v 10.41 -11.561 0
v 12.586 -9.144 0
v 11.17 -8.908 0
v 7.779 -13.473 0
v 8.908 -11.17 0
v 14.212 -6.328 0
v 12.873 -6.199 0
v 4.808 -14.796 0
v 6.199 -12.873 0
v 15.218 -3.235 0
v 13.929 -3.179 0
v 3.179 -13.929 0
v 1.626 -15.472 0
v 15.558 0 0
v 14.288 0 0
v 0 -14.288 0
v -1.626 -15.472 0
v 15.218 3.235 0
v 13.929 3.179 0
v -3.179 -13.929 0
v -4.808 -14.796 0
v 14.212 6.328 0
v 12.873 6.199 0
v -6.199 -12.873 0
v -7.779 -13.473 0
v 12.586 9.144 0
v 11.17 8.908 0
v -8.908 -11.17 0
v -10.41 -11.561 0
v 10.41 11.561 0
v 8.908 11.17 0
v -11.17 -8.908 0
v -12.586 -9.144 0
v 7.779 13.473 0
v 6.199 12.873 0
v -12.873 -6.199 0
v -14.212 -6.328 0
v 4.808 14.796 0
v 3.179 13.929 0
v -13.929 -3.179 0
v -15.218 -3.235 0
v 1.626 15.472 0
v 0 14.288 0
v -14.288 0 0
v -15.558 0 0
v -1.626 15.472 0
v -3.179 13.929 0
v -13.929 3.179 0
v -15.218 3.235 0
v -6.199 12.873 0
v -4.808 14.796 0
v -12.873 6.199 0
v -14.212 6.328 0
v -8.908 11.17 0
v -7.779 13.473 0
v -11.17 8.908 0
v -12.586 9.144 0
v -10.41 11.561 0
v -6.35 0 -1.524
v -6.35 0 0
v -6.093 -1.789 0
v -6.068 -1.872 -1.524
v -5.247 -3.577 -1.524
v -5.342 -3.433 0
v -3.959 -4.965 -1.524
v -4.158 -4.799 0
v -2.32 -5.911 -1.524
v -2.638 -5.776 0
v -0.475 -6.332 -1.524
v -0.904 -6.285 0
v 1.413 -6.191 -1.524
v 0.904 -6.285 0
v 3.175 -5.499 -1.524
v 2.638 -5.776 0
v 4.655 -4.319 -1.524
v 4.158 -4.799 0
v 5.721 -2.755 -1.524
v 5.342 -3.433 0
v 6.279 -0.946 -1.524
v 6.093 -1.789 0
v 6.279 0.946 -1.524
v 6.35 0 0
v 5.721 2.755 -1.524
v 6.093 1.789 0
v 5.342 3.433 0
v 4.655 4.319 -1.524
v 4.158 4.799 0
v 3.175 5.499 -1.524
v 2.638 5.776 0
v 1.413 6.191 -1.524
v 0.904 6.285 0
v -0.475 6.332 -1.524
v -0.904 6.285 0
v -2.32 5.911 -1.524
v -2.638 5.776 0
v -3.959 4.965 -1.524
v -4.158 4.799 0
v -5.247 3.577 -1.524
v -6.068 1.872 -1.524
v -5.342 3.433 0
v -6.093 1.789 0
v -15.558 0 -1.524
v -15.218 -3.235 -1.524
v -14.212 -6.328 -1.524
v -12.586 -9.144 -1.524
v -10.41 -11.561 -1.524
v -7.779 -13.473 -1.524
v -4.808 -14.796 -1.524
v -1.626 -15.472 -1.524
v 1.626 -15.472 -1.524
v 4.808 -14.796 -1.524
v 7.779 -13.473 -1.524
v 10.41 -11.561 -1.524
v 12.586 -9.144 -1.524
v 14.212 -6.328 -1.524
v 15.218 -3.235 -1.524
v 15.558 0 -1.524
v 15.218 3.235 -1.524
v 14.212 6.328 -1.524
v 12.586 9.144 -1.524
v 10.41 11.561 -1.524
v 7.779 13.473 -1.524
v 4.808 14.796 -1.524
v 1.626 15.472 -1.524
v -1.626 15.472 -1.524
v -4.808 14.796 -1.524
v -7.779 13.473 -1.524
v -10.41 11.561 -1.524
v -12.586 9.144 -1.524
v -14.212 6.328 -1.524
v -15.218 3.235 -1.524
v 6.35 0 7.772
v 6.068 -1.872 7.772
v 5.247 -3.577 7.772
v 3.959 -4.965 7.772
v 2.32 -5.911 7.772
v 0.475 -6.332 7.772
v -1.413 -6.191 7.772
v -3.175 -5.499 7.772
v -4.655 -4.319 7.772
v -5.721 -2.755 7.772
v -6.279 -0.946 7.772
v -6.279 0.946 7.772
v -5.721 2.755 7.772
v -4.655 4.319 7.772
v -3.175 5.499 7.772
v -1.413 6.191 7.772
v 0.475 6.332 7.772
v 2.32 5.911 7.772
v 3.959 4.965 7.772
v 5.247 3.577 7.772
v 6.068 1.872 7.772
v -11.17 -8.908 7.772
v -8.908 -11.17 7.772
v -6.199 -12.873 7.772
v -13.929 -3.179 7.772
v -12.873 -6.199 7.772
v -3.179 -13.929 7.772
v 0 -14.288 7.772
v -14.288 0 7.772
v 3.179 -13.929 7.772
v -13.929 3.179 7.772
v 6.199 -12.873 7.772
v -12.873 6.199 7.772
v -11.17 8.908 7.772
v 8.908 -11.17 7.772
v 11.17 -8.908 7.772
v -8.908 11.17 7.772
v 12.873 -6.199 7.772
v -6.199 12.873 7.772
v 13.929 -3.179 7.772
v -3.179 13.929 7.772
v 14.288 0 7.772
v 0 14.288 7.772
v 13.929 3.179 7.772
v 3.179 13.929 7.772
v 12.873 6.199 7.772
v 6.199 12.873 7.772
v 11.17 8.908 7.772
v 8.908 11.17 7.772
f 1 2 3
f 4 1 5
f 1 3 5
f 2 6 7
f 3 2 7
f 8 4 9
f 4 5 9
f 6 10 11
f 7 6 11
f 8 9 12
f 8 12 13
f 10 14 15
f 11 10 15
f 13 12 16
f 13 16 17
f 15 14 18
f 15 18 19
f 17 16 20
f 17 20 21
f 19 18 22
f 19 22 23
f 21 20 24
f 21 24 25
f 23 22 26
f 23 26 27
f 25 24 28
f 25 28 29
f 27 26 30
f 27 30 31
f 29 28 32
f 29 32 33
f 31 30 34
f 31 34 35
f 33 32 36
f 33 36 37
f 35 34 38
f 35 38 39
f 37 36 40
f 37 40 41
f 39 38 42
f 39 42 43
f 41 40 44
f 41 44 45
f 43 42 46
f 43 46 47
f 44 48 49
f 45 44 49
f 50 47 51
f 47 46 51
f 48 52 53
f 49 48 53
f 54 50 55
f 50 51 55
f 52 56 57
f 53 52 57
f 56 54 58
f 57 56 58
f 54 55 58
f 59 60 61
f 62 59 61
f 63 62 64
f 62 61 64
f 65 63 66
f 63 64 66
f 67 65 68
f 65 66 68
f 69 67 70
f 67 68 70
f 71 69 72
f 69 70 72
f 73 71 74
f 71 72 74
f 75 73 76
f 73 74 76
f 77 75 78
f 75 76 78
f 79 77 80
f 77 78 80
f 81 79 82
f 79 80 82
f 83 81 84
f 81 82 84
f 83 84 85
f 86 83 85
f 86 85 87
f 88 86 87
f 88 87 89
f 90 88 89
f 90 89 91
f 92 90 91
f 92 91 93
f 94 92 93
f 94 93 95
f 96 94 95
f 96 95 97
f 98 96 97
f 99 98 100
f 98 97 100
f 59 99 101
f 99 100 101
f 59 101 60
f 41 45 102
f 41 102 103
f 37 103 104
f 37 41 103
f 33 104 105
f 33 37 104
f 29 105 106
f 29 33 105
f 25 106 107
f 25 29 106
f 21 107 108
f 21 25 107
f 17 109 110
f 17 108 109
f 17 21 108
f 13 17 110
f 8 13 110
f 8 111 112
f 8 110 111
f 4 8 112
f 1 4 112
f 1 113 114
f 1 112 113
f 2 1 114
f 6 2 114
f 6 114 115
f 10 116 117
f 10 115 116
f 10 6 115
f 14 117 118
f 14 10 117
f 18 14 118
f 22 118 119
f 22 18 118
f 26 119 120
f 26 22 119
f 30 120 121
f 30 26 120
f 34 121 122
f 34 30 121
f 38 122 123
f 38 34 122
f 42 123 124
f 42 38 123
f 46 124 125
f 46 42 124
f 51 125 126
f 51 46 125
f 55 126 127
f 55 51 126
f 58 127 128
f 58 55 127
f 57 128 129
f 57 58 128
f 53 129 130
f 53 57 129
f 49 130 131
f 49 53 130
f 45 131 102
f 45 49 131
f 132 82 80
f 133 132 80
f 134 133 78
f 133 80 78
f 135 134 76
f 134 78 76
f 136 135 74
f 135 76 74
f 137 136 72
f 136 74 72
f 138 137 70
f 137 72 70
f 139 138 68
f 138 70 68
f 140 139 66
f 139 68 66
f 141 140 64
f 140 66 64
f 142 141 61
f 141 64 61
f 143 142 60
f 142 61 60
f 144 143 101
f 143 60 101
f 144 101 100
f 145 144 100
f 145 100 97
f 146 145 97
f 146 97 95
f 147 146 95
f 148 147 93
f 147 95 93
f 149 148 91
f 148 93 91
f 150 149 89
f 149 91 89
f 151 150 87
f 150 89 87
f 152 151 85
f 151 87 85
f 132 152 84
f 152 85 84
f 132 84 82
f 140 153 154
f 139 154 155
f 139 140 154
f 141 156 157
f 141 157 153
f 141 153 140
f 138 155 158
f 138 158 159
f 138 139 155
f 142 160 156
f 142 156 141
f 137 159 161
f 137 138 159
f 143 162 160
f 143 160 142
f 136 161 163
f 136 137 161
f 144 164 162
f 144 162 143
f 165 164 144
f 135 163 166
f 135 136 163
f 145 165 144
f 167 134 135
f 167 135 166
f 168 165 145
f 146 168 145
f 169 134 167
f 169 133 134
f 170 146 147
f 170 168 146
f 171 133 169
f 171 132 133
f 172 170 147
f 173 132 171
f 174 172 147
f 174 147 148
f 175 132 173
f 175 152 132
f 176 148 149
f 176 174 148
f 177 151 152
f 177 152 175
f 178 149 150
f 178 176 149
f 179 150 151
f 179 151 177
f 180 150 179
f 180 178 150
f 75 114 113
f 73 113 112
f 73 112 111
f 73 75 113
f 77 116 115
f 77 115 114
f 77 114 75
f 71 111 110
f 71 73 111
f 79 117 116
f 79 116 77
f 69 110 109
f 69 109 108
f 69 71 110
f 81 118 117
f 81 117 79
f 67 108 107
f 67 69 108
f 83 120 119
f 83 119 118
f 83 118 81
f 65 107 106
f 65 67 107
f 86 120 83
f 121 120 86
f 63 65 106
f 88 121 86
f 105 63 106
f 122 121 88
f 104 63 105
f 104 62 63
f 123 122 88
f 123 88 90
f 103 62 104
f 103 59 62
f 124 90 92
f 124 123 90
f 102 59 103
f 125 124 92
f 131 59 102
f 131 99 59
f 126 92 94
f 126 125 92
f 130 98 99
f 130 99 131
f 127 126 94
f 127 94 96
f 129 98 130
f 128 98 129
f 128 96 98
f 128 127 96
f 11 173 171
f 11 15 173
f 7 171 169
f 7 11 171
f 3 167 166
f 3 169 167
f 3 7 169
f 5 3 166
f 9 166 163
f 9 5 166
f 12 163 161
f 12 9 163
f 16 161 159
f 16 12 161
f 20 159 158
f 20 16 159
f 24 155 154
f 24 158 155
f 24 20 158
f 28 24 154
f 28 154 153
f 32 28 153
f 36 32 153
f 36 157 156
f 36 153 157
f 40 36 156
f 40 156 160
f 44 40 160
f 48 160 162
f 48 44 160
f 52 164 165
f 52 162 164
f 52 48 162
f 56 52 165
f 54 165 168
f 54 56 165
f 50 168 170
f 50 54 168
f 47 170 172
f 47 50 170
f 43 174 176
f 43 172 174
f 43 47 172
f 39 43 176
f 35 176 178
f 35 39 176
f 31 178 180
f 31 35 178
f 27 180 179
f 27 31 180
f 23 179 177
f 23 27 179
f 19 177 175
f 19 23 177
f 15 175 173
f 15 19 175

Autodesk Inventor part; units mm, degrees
ref_plane "YZ Plane" through (0, 0, 0) normal (1, 0, 0) x (0, 1, 0)
ref_plane "XZ Plane" through (0, 0, 0) normal (0, 1, 0) x (-1, 0, 0)
ref_plane "XY Plane" through (0, 0, 0) normal (0, 0, 1) x (1, 0, 0)
sketch "Sketch1" plane through (0, 0, 0) normal (0, 0, 1) x (1, 0, 0)
  circle A0 centre (0, 0) radius 14.2875
  circle A1 centre (0, 0) radius 6.35
  dimension "d0" = 28.575
  dimension "d1" = 12.7
extrude "Extrusion1" add sketch "Sketch1" along normal blind 7.7724
sketch "Sketch2" plane through (0, 0, 0) normal (0, 0, -1) x (-1, 0, 0)
  circle A0 centre (0, 0) radius 15.5575
  circle A1 centre (0, 0) radius 14.2875 projected
  circle A2 centre (0, 0) radius 6.35
  dimension "d4" = 31.115
  dimension "d5" = 12.7
extrude "Extrusion2" add sketch "Sketch2" along normal blind 1.524 contours A0 | A1
properties part number "bearing"
